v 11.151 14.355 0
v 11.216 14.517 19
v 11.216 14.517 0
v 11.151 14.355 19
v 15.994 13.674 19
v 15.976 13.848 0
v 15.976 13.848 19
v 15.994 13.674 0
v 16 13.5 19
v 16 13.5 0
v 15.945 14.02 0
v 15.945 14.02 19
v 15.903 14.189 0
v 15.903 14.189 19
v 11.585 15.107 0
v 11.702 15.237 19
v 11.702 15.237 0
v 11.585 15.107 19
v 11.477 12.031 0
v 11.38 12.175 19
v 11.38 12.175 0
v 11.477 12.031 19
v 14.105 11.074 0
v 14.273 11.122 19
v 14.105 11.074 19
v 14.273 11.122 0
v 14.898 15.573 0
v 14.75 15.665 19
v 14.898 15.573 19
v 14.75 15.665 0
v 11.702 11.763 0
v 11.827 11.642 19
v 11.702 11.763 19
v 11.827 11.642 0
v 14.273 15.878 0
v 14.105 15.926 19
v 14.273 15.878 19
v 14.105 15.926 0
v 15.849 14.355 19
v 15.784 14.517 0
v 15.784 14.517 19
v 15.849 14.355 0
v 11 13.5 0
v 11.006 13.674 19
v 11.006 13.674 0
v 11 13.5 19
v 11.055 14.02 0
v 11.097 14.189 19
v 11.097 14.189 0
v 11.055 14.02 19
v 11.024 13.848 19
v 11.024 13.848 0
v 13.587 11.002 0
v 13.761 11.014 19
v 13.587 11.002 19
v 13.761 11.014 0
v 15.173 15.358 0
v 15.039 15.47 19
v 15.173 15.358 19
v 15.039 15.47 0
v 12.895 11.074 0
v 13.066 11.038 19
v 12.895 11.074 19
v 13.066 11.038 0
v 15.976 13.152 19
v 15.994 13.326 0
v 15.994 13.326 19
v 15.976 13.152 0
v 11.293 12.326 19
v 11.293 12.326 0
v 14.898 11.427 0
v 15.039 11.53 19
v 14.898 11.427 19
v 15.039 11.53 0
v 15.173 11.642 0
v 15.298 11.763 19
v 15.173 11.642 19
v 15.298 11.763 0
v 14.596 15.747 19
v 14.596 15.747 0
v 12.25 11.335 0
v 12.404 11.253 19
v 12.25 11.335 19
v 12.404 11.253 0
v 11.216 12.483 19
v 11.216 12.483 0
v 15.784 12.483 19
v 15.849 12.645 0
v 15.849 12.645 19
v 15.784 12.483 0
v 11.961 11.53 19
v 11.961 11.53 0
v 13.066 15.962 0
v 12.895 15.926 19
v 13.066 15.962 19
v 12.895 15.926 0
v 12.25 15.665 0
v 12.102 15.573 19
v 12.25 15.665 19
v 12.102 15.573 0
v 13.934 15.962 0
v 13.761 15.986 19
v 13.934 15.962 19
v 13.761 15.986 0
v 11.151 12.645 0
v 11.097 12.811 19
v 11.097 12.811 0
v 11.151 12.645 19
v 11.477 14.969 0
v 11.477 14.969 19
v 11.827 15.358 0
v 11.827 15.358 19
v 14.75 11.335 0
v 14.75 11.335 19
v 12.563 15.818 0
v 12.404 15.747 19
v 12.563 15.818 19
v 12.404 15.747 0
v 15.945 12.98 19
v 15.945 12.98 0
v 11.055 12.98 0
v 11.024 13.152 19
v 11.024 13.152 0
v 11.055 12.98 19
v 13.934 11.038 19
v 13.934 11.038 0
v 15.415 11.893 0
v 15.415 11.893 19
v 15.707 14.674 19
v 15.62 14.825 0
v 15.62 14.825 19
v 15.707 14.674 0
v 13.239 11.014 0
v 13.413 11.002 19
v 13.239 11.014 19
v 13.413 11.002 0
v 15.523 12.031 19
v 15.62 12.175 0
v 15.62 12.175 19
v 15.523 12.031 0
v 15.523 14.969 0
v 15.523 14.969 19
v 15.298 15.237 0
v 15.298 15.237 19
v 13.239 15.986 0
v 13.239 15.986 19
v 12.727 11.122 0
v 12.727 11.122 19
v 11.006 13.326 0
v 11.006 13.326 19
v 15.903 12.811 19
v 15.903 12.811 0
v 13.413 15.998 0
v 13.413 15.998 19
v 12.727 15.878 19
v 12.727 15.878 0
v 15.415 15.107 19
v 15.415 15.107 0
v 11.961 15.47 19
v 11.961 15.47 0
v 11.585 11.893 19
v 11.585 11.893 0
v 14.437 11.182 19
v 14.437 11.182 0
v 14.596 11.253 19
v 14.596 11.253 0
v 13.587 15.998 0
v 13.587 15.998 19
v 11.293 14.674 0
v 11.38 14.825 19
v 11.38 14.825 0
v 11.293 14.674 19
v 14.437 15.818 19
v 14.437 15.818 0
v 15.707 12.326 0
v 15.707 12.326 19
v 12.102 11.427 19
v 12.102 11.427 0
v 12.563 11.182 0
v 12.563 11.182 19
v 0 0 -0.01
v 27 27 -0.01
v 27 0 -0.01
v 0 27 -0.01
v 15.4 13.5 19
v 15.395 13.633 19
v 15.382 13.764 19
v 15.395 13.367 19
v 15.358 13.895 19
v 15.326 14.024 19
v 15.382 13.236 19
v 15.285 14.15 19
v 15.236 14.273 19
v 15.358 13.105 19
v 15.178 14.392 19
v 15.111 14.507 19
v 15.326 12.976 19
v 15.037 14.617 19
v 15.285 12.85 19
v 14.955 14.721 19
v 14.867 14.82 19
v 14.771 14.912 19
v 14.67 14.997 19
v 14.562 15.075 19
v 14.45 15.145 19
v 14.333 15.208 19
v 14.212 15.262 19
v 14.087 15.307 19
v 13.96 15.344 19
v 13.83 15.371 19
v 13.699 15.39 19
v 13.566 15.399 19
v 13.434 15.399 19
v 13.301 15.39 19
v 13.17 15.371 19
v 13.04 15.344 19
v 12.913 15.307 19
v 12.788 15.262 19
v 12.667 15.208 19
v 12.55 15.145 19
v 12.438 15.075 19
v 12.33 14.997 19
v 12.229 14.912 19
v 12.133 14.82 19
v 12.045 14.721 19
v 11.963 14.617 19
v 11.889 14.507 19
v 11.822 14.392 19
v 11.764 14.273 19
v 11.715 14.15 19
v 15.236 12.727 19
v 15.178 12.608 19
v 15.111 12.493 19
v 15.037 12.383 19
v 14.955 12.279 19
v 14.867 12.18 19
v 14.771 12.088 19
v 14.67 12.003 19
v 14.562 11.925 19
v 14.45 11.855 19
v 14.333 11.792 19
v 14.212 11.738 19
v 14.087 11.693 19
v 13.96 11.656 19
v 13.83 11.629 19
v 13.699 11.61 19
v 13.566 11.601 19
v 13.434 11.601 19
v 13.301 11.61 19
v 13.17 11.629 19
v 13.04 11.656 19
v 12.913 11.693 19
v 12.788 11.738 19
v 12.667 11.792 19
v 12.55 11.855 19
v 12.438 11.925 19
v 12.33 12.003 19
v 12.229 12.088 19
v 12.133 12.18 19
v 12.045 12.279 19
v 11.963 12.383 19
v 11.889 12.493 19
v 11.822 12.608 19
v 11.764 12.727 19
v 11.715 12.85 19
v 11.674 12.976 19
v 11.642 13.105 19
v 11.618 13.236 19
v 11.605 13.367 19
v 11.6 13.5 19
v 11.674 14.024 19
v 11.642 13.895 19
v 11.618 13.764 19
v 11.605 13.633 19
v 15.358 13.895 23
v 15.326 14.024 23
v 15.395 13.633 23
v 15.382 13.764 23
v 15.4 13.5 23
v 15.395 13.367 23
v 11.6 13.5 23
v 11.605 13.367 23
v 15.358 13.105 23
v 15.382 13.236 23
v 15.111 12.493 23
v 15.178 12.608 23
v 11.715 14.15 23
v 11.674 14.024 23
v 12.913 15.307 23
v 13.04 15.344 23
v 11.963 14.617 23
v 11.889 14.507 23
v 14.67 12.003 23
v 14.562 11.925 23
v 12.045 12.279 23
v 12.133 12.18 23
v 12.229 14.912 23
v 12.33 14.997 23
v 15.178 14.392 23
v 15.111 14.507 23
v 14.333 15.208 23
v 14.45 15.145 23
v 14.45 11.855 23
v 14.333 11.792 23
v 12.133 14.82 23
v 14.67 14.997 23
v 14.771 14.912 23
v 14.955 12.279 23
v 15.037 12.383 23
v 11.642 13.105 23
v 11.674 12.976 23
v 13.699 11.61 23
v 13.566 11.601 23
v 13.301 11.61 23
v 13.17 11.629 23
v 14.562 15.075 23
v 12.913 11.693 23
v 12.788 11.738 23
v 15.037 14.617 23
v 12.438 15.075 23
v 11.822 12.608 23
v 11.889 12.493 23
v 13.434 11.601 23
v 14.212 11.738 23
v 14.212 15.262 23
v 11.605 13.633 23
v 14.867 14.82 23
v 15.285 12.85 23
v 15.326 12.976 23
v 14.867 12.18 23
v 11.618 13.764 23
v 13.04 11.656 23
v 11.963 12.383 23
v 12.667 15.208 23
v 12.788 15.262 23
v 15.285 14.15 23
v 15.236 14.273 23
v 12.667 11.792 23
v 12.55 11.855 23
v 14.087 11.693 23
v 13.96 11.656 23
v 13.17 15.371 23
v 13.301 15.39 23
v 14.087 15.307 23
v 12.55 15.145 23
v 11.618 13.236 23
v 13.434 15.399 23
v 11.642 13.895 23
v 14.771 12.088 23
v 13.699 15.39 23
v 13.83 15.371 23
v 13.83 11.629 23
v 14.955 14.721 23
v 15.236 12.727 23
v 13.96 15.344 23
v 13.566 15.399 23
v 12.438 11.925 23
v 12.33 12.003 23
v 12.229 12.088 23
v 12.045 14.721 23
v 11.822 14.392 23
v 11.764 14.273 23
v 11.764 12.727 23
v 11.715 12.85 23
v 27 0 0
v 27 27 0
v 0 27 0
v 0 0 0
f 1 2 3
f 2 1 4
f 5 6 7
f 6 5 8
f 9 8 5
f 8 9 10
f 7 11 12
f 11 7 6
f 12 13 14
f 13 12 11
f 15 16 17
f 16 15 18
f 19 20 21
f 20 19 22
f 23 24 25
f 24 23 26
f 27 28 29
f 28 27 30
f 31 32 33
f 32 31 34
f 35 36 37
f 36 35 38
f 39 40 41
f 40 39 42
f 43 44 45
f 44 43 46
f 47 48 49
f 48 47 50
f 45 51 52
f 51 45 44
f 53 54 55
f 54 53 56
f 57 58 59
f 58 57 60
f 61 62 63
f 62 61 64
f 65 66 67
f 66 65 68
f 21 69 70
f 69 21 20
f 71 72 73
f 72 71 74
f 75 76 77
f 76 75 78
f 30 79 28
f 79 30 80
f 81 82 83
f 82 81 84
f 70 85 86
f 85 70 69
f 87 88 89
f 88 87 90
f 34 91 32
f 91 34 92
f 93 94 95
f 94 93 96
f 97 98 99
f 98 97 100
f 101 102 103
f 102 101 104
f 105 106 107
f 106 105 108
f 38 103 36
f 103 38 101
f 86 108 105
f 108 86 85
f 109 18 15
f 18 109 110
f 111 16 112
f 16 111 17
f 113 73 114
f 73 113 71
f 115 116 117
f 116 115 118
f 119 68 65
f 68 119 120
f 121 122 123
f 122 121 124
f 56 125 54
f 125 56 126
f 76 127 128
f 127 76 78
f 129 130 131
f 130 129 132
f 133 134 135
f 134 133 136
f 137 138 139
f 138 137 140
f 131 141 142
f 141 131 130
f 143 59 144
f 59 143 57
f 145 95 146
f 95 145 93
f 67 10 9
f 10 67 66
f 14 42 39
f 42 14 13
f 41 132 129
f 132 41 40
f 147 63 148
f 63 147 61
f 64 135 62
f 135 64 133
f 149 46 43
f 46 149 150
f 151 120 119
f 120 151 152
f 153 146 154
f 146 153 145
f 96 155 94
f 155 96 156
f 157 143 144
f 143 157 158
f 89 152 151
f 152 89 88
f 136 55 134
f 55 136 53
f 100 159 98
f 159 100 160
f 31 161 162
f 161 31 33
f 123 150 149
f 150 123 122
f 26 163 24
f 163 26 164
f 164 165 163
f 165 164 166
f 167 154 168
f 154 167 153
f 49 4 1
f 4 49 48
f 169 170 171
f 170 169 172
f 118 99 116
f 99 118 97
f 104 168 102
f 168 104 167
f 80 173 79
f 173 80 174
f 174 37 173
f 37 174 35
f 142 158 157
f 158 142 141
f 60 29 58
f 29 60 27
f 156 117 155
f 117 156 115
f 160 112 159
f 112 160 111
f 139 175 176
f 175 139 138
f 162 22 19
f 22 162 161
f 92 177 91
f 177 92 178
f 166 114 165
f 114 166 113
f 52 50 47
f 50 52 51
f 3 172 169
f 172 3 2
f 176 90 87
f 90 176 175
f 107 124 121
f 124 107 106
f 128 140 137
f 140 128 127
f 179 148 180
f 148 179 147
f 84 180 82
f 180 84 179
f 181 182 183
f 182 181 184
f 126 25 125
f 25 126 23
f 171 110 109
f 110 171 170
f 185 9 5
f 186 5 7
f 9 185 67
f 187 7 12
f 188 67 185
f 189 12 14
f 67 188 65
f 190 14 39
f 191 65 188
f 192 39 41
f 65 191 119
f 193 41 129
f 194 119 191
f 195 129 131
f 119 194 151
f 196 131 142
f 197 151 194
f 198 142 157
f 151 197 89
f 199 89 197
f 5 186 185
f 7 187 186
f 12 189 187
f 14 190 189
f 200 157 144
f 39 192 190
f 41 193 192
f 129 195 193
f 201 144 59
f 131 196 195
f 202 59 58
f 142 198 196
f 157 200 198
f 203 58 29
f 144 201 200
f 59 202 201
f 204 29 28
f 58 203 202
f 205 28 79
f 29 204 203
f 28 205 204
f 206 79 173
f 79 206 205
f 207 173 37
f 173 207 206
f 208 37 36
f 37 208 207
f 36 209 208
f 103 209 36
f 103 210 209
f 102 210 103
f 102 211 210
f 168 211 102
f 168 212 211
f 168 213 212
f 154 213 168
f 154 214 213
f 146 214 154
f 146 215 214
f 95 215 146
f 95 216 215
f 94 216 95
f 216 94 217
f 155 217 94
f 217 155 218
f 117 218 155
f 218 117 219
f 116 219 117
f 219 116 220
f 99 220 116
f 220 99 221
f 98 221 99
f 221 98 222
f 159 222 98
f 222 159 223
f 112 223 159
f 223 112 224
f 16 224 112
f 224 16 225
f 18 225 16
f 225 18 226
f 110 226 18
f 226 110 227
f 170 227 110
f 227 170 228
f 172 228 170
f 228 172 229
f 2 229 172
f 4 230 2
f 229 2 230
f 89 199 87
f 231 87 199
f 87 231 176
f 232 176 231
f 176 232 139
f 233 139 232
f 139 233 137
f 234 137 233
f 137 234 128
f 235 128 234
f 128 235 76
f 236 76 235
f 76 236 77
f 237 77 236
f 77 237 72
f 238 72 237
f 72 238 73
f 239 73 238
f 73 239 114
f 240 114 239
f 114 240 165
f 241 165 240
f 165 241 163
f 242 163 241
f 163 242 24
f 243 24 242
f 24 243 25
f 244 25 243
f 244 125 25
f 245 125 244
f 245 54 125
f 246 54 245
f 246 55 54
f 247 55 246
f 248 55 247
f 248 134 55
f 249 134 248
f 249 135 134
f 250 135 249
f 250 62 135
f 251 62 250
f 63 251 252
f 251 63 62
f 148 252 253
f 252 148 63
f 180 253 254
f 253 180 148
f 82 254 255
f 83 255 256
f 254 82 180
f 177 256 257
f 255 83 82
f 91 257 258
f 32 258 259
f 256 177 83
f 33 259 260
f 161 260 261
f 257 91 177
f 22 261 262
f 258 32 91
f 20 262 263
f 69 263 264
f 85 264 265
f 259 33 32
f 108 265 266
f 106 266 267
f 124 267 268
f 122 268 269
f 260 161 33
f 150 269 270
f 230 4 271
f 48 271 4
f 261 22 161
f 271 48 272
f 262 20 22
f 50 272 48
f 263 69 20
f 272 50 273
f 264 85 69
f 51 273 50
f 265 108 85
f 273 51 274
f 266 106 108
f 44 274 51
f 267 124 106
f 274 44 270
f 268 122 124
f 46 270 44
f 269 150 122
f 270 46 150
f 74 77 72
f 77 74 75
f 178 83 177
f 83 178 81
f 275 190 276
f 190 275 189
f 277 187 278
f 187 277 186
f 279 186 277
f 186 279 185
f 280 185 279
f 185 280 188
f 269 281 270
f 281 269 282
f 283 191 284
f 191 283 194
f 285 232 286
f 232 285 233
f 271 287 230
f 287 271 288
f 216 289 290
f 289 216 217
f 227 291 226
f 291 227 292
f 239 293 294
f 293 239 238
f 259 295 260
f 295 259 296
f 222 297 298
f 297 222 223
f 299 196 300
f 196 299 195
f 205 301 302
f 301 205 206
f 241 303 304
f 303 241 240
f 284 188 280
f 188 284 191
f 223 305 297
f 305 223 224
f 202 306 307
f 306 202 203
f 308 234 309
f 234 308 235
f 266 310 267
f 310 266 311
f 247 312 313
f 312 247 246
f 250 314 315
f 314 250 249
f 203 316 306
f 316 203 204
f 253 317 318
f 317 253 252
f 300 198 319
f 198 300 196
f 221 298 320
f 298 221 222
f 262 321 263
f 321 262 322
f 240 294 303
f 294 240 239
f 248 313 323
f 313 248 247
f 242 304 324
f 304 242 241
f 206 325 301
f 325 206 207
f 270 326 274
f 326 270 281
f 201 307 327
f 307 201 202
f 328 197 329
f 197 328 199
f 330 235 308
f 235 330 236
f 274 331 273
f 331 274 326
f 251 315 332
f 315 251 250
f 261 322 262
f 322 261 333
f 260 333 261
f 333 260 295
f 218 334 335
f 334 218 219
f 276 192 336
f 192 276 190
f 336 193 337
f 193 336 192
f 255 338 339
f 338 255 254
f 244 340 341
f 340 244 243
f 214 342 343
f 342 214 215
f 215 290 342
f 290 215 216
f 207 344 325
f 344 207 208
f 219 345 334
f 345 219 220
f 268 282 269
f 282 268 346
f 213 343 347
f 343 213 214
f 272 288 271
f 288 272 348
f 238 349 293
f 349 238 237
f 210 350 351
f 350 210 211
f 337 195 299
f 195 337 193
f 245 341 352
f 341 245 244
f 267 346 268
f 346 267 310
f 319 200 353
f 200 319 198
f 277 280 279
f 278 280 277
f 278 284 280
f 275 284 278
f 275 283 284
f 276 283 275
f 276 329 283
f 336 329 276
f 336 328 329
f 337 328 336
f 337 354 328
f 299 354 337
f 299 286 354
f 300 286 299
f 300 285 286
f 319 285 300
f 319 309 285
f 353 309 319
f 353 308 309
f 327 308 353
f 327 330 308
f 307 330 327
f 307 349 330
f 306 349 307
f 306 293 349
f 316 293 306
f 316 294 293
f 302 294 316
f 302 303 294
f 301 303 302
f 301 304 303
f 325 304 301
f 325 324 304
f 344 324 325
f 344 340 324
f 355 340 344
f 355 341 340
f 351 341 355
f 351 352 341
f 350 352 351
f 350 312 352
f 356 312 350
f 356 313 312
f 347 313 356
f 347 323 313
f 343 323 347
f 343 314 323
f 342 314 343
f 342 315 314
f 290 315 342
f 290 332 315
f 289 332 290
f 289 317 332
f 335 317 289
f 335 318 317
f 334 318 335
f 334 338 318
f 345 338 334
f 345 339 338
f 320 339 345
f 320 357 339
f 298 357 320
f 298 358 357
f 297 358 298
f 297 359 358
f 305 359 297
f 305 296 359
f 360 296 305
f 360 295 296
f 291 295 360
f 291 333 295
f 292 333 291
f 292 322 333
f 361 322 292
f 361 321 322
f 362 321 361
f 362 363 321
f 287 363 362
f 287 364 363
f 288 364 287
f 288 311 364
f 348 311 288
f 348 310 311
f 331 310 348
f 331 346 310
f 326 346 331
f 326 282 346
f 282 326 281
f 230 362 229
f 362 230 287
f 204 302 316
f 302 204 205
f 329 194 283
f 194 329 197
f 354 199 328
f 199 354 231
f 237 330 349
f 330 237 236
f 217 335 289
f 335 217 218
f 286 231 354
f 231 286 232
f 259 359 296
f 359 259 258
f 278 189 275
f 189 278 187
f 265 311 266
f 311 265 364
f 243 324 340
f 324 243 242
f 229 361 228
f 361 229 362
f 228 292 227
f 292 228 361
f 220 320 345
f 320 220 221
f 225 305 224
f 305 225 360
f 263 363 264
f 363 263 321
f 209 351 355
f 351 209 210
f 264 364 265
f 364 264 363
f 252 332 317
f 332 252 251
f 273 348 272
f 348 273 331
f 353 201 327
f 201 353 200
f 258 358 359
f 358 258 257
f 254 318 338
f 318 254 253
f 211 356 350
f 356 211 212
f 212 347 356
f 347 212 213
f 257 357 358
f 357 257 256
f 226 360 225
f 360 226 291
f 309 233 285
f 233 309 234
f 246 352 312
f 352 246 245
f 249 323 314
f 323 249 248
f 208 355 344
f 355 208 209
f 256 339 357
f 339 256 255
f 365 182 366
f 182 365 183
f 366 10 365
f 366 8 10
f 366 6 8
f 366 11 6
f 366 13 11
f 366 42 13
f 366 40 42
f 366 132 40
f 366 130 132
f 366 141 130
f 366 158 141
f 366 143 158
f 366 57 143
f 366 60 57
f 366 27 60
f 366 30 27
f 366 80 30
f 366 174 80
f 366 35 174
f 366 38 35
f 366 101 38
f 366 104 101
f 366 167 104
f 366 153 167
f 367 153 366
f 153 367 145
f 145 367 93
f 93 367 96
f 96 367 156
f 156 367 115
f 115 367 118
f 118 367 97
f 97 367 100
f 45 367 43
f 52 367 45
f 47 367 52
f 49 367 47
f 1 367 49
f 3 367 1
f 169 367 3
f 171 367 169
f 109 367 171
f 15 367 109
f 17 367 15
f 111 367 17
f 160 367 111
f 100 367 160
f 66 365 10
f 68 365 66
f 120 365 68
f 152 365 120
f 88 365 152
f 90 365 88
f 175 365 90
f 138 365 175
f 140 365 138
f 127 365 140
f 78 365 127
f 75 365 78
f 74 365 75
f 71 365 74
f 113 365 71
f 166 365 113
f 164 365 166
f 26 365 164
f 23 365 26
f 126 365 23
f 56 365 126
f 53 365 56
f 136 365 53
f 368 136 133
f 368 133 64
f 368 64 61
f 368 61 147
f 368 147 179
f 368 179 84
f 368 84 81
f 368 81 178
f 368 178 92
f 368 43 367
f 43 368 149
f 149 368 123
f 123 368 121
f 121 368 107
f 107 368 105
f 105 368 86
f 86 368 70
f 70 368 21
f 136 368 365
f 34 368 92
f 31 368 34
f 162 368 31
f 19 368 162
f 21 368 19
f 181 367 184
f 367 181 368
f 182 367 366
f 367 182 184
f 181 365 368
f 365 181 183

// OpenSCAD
// file: ../Base/Rotation.scad
// Fischertechnik Box Foundation
// Geometry Helpers Rotation

include <PlacementOptions.scad>

// getRotatedSpace(space, rotation=NoRotation)
// Rotates the space dependent on the specified rotation

function getRotatedSpace(space, rotation=NoRotation) = [
    (rotation == Rotate90 || rotation == Rotate270) ? space.y : space.x,
    (rotation == Rotate90 || rotation == Rotate270) ? space.x : space.y
];

// Rotates the given space around the fixed left lower corner
// space = the space the children needs as width/depth list [width,depth]
// rotation = 0 Rotate0 degrees, 1 Rotate90 degrees, 2 Rotate180 degrees, 3 Rotate270 degrees (equivalent to -90)

module RotateFix(space, rotation=NoRotation) {
    dy = (rotation == Rotate0 || rotation == Rotate270) ? 0 :
        (rotation == Rotate90) ? space.x :
        space.y;
    dx = (rotation < Rotate180) ? 0 :
        (rotation == Rotate180) ? space.x :
        space.y;
    
    translate([dx, dy, 0])
        rotate([0, 0, rotations[rotation]])
            children();
}
// file: ../Base/Alignment.scad
// Fischertechnik Box Foundation
// Geometry Helpers Alignment

include <PlacementOptions.scad>

// getAlignedX(elementWidth, spaceWidth, align=AlignRight, offset=0)
// Gets the aligned X offset of an element with the given
// width in the given space.
// elementWidth = The width of the element to positon
// spaceWidth = The space where the element should be aligned
// align = 0 AlignLeft, 1 AlignCenter, 2 AlignRight
// offset = an optional offset from the aligned position. When
// aligned left or centered, then positive values are in X direction.
// When aligned right then positive values are in negative X direction.

function getAlignedX(elementWidth, spaceWidth, align=AlignRight, offset=0) =
    (align == AlignLeft) ?
        offset :
        ((align == AlignCenter) ?
        (spaceWidth - elementWidth)/2 + offset :
        spaceWidth - offset - elementWidth);

// getAlignedY(elementDepth, spaceDepth, align=AlignTop, offset=0)
// Gets the aligned Y offset of an element with the given
// depth in the given space.
// elementDepth = The depth of the element to positon
// spaceDepth = The space where the element should be aligned
// align = 0 AlignBottom, 1 AlignCenter, 2 AlignTop
// offset = an optional offset from the aligned position. When
// aligned bottom or centered, then positive values are in Y direction.
// When aligned top then positive values are in negative Y direction.

function getAlignedY(elementDepth, spaceDepth, align=AlignTop, offset=0) =
    (align == AlignBottom) ?
        offset :
        ((align == AlignCenter) ?
        (spaceDepth - elementDepth)/2 + offset :
        spaceDepth - offset - elementDepth);
// file: ../Base/PlacementOptions.scad
// Fischertechnik Box Foundation
// Placement Options

// Alignment
NoAlign = 0;
AlignLeft = 1;
AlignBottom = 2;
AlignCenter = 3;
AlignRight = 4;
AlignTop = 5;

// Element rotation degree steps
rotations = [0, -90, -180, -270];

// Rotation
NoRotation = 0;
Rotate0 = 0;
Rotate90 = 1;
Rotate180 = 2;
Rotate270 = 3;

// Docking (seen from above)
NoDock = -1;
DockLeft = 0;
DockTop = 1;
DockRight = 2;
DockCorner = 2;
DockBottom = 3;

// Web corners
LowerLeft = 0;
UpperLeft = 1;
UpperRight = 2;
LowerRight = 3;

// Web position relative to corner
LeftOfCorner = 0;
RightOfCorner = 1;
// file: ../Base/Boxes.scad
// Fischertechnik Box Foundation
// Pre-designed Boxes

use <Constants.scad>

include <PlacementOptions.scad>

box190Width = 190;
box190Depth = 130;
box130Width = 130;
box130Depth = 95;

// Values are from an original ec3 box
topBottomDifference = 1.5;
outerHeight = 40;
baseThickness = 1.8;
innerHeight = outerHeight - baseThickness;
stackExcess = 5.7;
radius = 3.5;
wallThickness = 1.5;
tolerance = 0.2;

boxWallThickness = wallThickness;
boxBaseThickness = baseThickness;
boxWebWidth = 3.0;

// getBoxWallThickness()
// Gets the wall thickness of a Fischertechnik Box
function getBoxWallThickness() = boxWallThickness;

// getBoxUsageHeight(height = 38.2)
// Gets the usable height of a Fischertechnik box
// height = Outer height of the box from the bottom to the upper edge.
function getBoxUsageHeight(height = outerHeight) = height - baseThickness - stackExcess;

// getBoxInnerHeight()
// Gets the inner height of a Fischertechnik box, including the stack excess
function getBoxInnerHeight() = innerHeight;

// getBoxBaseThickness()
// Gets the thickness of the Fischertechnik box base.
function getBoxBaseThickness() = boxBaseThickness;

// getBoxWebWidth()
// Gets the width of a box web
function getBoxWebWidth() = boxWebWidth;

// getBox190Space()
// Gets the usable inner space of a Box 190 as an x/y-list
function getBox190Space() = [
    box190Width - 2*getBoxWallThickness() - topBottomDifference, 
    box190Depth - 2*getBoxWallThickness() - topBottomDifference ];

// RoundedCornerPlate(width, depth, height, radius)
// Creates a body plate with rounded corners for a box. Used
// also to create the complete box with the hull module.
// width = Width of the plate
// depth = depth of the plate 
// height = thickness of the plate
// radius = radius of the rounded corner
module RoundedCornerPlate(width, depth, height, radius) {
    translate([radius, radius])
    hull() {
        w = width-2*radius;
        d = depth-2*radius;
        cube([w, d, height]);
        cylinder(height, r=radius, $fn=getFragments());
        translate([w, 0])
            cylinder(height, r=radius, $fn=getFragments());
        translate([w, d])
            cylinder(height, r=radius, $fn=getFragments());
        translate([0, d])
            cylinder(height, r=radius, $fn=getFragments());
    }
}

// BoxBase(width, depth)
// Creates an empty stackable Fischertechnik compatible box
// width = Outer width of the box (190, 130, ...)
// depth = Outer depth of the box (130, 95, ...)

module BoxBase(width, depth, height=outerHeight) {    
    thinPlate = 0.01;

    innerHeight = height - baseThickness;    
    
    module Body(tolerance=tolerance) {
        hull() {
            // Bottom with tolerance to fit into the original boxes when stacked
            translate([-wallThickness+tolerance, -wallThickness+tolerance, -baseThickness])
                RoundedCornerPlate(width-topBottomDifference-2*tolerance, depth-topBottomDifference-2*tolerance, thinPlate, radius);
            
            // Top
            translate([-wallThickness-topBottomDifference/2, -wallThickness-topBottomDifference/2, innerHeight-thinPlate])
                RoundedCornerPlate(width, depth, thinPlate, radius);
         }
    }

    module Cutoff() {
        hull() {
            coWidth = width - 2*wallThickness;
            coDepth = depth - 2*wallThickness;
            
            // Bottom
            RoundedCornerPlate(coWidth-topBottomDifference, coDepth-topBottomDifference, thinPlate, radius);

            // Top
            translate([-topBottomDifference/2, -topBottomDifference/2, innerHeight+thinPlate]) 
                RoundedCornerPlate(coWidth, coDepth, thinPlate, radius);
        }
    }
    
    difference() {        
        Body();
        Cutoff();
        stackOffset = innerHeight - stackExcess;
        translate([0, 0, stackOffset + baseThickness])
            Body(tolerance=0);
    }
}

// Creates the Fischertechnik empty box 130x190 mm and places it at position 0,0
// 190x130 are the outer sizes, the inner space is slightly smaller. Use getBox190Space() to get the inner sizes.
// The box is positioned that the usable inner space is at the 0,0,0 position.

module Box190() {
    BoxBase(box190Width, box190Depth);
}

// Gets the usable inner space of a Box 130 as an x/y-list
function getBox130Space() = [
    box130Width - 2*getBoxWallThickness() - topBottomDifference, 
    box130Depth - 2*getBoxWallThickness() - topBottomDifference ];

// Creates the Fischertechnik empty box 95x130 mm and places it at position 0,0
// 190x130 are the outer sizes, the inner space is slightly smaller. Use getBox190Space() to get the inner sizes.
// The box is positioned that the usable inner space is at the 0,0,0 position.

module Box130() {
    BoxBase(box130Width, box130Depth);
}

// Creates a web at the specified box walls
// corner 0 = LowerLeft, 1 = UpperLeft, 2 = UpperRight, 3 = LowerRight
// side 0 = LeftOfCorner, 1 = RightOfCorner
// distance = Distance in mm from the corner
// boxSpace = inner width and depth of the box (default: Box 190)
// webWidth = length of the web (default is 3 mms)
// webThickness = thickness of the web (default is 1 mm)
// height = Height of the web (standard is getBoxUsageHeight())
// sink = How much of the web is sunk into the wall

module BoxWeb(
    corner, 
    side, 
    distance, 
    boxSpace=getBox190Space(), 
    webWidth=getBoxWebWidth(), 
    webThickness=1.0, 
    height=getBoxUsageHeight(),
    sink = getBoxWallThickness()/2) {
    width = (corner % 2 == 0) ? 
            (side == LeftOfCorner ? webWidth : webThickness) :
            (side == LeftOfCorner ? webThickness : webWidth);

    depth = (corner % 2 == 0) ? 
            (side == RightOfCorner ? webWidth : webThickness) :
            (side == RightOfCorner ? webThickness : webWidth);
    
    xDiff = corner == LowerLeft ? 
                (side == LeftOfCorner ? -sink : distance) :
            (corner == UpperLeft ?                
                (side == LeftOfCorner ? distance : -sink) :
            (corner == UpperRight ?
                (side == LeftOfCorner ? boxSpace.x-webWidth+sink : boxSpace.x-distance-webThickness) :
                (side == LeftOfCorner ? boxSpace.x-distance-webThickness: boxSpace.x-webWidth+sink)));

    yDiff = corner == LowerLeft ? 
                (side == RightOfCorner ? -sink : distance) :
            (corner == UpperLeft ?
                (side == RightOfCorner ? boxSpace.y-distance-webThickness : boxSpace.y-webWidth+sink) :
            (corner == UpperRight ?
                (side == RightOfCorner ? boxSpace.y-webWidth+sink : boxSpace.y-distance-webThickness) :
                (side == RightOfCorner ? distance : -sink)));
    
    translate([xDiff, yDiff, -getExcess()])
        cube([width, depth, height + 2*getExcess()]);
}
// file: ../Base/Placement.scad
// Fischertechnik Box Foundation
// Geometry Helpers Placement

use <Constants.scad>
use <Alignment.scad>
use <Rotation.scad>
use <Boxes.scad>

include <PlacementOptions.scad>

// Place(x=0, y=0, elementSpace=[0,0], alignX=AlignLeft, alignY=AlignBottom, rotation=Rotate0, boxSpace=getBox190Space())
// Places the child at the specified position
// y = Y-Position. This is a relative position when an X aligment is specified.
// x = X-Position. This is a relative position when an Y aligment is specified.
// elementSpace = space of the element to be placed [x,y]
// alignX = -1=NoAlign, 0 AlignLeft, 1 AlignCenter, 3 AlignRight (elementSpace and boxSpace required!)
// alignY = -1=NoAlign, 2 AlignBottom, 1 AlignCenter, 4 AlignTop (elementSpace and boxSpace required!)
// rotation = 0 Rotate0 0 degrees, 1 Rotate90 90 degrees, 
// 2 Rotate180 180 degrees, 3 Rotate270 270 degrees (equivalent to -90)
// boxSpace = Inner space of the box where the placement occurs [x,y] - default is Box 190x130 inner space

module Place(x=0, y=0, elementSpace=[0,0], 
  alignX=AlignLeft, alignY=AlignBottom, 
  rotation=NoRotation, boxSpace=getBox190Space()) {

    module Position(x, y, space, rotation=Rotate0) {
        translate([x, y, 0])
            RotateFix(space, rotation)
                children();
    }

    space = getRotatedSpace(elementSpace, rotation);
    alignedX = getAlignedX(space.x, boxSpace.x, alignX, x);
    alignedY = getAlignedY(space.y, boxSpace.y, alignY, y);
    Position(alignedX, alignedY, elementSpace, rotation)
        children();
}

// Center(space=getBox130Space(), elementSpace=[0,0])
// space = Space where the children is centered. For cylinder use centered=true and no elementSpace.
// elementSpace = space of the element to be centered [x,y]

module Center(space=getBox190Space(), elementSpace=[0,0]) {
    Place(elementSpace=elementSpace, boxSpace=space, alignX=AlignCenter, alignY=AlignCenter)
        children();
}

// CenterHorizontal(width=0, y=0, offset=0, space=getBox130Space())
// width = Width of the element to be placed.
// y = Y position of the element
// offset = Offset from the center position (negative will be left of the center)
// space = Space where the element is placed

module CenterHorizontal(width=0, y=0, offset=0, space=getBox190Space()) {
    Place(x=offset, y=y, elementSpace=[width, 0], boxSpace=space, alignX=AlignCenter)
        children(0);
}

// CenterVertical(depth=0, x=0, offset=0, space=getBox130Space())
// depth = Depth of the element to be placed.
// x = X position of the element
// offset = Offset from the center position (negative will be down of the center)
// space = Space where the element is placed

module CenterVertical(depth=0, x=0, offset=0, space=getBox190Space()) {
    Place(x=x, y=offset, elementSpace=[0, depth], boxSpace=space, alignY=AlignCenter)
        children(0);
}

// getIsVertical(align)
// True if the specified alignment needs a vertical orientation for a divider (AlignRight, AlignLeft)

function getIsVertical(align) = (align == AlignRight || align == AlignLeft);

// getIsHorizontal(align)
// True if the specified alignment needs a horizontal orientation for a divider (AlignTop, AlignBottom)

function getIsHorizontal(align) = (align == AlignTop || align == AlignBottom);
// file: ../Base/Constants.scad
// Fischertechnik Box Foundation
// Constants

// Constant values necessary for multiple elements

// Base constants
dividerThickness = 1.2;
excess = 0.01;
fragments = 90;
tolerance = 0.8;

// Gets the thickness of a divider 
function getDividerThickness() = dividerThickness;

// Gets the excess that is used to merge walls into each other
function getExcess() = excess;

// Gets amount of fragments of a cylinder
function getFragments() = fragments;

// Gets the inner tolerance of a frame to each side
function getTolerance() = tolerance;


// Fischertechnik specific constants
axisDiameter = 4;
axisBottomDiameter = axisDiameter + 1;
axisTolerance = 0.2;

// Gets axis diameter of Fischertechnik axis
function getAxisDiameter() = axisDiameter;

// Gets axis diameter tolerance (subtracted for element axis)
function getAxisTolerance() = axisTolerance;

// Gets the axis diameter for standing axis
function getStandAxisDiameter() = getAxisDiameter() - getAxisTolerance();

// Gets axis bottom diameter for thicker part at the bottom
function getAxisBottomDiameter() = axisBottomDiameter;

pinHeight = 2.5;

// gets the height of a connecting pin
function getPinHeight() = pinHeight;

standardEdgeDistance = 2.5;
standardWebDistance = 11.5;
standardCornerLength = 15;

// gets the standard distance to the wall of the box for dockable frames with webs
function getStandardEdgeDistance() = standardEdgeDistance;

// gets the standard distance of each web to the corner of the dockable frame
function getStandardWebDistance() = standardWebDistance;

// gets the standard length of the corner walls of a dockable frame
function getStandardCornerLength() = standardCornerLength;

tubeWallFactor = 0.8;

// gets the wall thickness of a tube.
function getTubeWallThickness() = tubeWallFactor * getDividerThickness();

smallPartsFrameHeight = 20;

// gets the frame height for docked small parts boxes.
function getSmallPartsFrameHeight() = smallPartsFrameHeight;

hubRingDiameter = 19.5;
hubRingLevelDiameter = 21;

// gets the diameter of a tube matching the inner ring of a wheel
function getHubRingDiameter() = hubRingDiameter;

// gets the diameter of a hub tube with a thicker diameter
function getHubRingLevelDiameter() = hubRingLevelDiameter;
// main file
// Fischertechnik Box Library
// Axis for idler gear Z15
// 35695

use <../ModelBase/Simple.scad>

/* [Hidden] */
width = 27;
depth = 27;
height = 23;

// getAxisIdlerGearZ15Space()
// Gets the space of an axis for an idler gear Z15 (mot2)

function getAxisIdlerGearZ15Space() = [width, depth, height];

// AxisIdlerGearZ15()
// Axis for for an idler gear Z15 (mot2)

module AxisIdlerGearZ15() {
    LeveledAxisWithSpace(height, height-4, getAxisIdlerGearZ15Space());
}

// Tests
color("lightgray")
AxisIdlerGearZ15();
